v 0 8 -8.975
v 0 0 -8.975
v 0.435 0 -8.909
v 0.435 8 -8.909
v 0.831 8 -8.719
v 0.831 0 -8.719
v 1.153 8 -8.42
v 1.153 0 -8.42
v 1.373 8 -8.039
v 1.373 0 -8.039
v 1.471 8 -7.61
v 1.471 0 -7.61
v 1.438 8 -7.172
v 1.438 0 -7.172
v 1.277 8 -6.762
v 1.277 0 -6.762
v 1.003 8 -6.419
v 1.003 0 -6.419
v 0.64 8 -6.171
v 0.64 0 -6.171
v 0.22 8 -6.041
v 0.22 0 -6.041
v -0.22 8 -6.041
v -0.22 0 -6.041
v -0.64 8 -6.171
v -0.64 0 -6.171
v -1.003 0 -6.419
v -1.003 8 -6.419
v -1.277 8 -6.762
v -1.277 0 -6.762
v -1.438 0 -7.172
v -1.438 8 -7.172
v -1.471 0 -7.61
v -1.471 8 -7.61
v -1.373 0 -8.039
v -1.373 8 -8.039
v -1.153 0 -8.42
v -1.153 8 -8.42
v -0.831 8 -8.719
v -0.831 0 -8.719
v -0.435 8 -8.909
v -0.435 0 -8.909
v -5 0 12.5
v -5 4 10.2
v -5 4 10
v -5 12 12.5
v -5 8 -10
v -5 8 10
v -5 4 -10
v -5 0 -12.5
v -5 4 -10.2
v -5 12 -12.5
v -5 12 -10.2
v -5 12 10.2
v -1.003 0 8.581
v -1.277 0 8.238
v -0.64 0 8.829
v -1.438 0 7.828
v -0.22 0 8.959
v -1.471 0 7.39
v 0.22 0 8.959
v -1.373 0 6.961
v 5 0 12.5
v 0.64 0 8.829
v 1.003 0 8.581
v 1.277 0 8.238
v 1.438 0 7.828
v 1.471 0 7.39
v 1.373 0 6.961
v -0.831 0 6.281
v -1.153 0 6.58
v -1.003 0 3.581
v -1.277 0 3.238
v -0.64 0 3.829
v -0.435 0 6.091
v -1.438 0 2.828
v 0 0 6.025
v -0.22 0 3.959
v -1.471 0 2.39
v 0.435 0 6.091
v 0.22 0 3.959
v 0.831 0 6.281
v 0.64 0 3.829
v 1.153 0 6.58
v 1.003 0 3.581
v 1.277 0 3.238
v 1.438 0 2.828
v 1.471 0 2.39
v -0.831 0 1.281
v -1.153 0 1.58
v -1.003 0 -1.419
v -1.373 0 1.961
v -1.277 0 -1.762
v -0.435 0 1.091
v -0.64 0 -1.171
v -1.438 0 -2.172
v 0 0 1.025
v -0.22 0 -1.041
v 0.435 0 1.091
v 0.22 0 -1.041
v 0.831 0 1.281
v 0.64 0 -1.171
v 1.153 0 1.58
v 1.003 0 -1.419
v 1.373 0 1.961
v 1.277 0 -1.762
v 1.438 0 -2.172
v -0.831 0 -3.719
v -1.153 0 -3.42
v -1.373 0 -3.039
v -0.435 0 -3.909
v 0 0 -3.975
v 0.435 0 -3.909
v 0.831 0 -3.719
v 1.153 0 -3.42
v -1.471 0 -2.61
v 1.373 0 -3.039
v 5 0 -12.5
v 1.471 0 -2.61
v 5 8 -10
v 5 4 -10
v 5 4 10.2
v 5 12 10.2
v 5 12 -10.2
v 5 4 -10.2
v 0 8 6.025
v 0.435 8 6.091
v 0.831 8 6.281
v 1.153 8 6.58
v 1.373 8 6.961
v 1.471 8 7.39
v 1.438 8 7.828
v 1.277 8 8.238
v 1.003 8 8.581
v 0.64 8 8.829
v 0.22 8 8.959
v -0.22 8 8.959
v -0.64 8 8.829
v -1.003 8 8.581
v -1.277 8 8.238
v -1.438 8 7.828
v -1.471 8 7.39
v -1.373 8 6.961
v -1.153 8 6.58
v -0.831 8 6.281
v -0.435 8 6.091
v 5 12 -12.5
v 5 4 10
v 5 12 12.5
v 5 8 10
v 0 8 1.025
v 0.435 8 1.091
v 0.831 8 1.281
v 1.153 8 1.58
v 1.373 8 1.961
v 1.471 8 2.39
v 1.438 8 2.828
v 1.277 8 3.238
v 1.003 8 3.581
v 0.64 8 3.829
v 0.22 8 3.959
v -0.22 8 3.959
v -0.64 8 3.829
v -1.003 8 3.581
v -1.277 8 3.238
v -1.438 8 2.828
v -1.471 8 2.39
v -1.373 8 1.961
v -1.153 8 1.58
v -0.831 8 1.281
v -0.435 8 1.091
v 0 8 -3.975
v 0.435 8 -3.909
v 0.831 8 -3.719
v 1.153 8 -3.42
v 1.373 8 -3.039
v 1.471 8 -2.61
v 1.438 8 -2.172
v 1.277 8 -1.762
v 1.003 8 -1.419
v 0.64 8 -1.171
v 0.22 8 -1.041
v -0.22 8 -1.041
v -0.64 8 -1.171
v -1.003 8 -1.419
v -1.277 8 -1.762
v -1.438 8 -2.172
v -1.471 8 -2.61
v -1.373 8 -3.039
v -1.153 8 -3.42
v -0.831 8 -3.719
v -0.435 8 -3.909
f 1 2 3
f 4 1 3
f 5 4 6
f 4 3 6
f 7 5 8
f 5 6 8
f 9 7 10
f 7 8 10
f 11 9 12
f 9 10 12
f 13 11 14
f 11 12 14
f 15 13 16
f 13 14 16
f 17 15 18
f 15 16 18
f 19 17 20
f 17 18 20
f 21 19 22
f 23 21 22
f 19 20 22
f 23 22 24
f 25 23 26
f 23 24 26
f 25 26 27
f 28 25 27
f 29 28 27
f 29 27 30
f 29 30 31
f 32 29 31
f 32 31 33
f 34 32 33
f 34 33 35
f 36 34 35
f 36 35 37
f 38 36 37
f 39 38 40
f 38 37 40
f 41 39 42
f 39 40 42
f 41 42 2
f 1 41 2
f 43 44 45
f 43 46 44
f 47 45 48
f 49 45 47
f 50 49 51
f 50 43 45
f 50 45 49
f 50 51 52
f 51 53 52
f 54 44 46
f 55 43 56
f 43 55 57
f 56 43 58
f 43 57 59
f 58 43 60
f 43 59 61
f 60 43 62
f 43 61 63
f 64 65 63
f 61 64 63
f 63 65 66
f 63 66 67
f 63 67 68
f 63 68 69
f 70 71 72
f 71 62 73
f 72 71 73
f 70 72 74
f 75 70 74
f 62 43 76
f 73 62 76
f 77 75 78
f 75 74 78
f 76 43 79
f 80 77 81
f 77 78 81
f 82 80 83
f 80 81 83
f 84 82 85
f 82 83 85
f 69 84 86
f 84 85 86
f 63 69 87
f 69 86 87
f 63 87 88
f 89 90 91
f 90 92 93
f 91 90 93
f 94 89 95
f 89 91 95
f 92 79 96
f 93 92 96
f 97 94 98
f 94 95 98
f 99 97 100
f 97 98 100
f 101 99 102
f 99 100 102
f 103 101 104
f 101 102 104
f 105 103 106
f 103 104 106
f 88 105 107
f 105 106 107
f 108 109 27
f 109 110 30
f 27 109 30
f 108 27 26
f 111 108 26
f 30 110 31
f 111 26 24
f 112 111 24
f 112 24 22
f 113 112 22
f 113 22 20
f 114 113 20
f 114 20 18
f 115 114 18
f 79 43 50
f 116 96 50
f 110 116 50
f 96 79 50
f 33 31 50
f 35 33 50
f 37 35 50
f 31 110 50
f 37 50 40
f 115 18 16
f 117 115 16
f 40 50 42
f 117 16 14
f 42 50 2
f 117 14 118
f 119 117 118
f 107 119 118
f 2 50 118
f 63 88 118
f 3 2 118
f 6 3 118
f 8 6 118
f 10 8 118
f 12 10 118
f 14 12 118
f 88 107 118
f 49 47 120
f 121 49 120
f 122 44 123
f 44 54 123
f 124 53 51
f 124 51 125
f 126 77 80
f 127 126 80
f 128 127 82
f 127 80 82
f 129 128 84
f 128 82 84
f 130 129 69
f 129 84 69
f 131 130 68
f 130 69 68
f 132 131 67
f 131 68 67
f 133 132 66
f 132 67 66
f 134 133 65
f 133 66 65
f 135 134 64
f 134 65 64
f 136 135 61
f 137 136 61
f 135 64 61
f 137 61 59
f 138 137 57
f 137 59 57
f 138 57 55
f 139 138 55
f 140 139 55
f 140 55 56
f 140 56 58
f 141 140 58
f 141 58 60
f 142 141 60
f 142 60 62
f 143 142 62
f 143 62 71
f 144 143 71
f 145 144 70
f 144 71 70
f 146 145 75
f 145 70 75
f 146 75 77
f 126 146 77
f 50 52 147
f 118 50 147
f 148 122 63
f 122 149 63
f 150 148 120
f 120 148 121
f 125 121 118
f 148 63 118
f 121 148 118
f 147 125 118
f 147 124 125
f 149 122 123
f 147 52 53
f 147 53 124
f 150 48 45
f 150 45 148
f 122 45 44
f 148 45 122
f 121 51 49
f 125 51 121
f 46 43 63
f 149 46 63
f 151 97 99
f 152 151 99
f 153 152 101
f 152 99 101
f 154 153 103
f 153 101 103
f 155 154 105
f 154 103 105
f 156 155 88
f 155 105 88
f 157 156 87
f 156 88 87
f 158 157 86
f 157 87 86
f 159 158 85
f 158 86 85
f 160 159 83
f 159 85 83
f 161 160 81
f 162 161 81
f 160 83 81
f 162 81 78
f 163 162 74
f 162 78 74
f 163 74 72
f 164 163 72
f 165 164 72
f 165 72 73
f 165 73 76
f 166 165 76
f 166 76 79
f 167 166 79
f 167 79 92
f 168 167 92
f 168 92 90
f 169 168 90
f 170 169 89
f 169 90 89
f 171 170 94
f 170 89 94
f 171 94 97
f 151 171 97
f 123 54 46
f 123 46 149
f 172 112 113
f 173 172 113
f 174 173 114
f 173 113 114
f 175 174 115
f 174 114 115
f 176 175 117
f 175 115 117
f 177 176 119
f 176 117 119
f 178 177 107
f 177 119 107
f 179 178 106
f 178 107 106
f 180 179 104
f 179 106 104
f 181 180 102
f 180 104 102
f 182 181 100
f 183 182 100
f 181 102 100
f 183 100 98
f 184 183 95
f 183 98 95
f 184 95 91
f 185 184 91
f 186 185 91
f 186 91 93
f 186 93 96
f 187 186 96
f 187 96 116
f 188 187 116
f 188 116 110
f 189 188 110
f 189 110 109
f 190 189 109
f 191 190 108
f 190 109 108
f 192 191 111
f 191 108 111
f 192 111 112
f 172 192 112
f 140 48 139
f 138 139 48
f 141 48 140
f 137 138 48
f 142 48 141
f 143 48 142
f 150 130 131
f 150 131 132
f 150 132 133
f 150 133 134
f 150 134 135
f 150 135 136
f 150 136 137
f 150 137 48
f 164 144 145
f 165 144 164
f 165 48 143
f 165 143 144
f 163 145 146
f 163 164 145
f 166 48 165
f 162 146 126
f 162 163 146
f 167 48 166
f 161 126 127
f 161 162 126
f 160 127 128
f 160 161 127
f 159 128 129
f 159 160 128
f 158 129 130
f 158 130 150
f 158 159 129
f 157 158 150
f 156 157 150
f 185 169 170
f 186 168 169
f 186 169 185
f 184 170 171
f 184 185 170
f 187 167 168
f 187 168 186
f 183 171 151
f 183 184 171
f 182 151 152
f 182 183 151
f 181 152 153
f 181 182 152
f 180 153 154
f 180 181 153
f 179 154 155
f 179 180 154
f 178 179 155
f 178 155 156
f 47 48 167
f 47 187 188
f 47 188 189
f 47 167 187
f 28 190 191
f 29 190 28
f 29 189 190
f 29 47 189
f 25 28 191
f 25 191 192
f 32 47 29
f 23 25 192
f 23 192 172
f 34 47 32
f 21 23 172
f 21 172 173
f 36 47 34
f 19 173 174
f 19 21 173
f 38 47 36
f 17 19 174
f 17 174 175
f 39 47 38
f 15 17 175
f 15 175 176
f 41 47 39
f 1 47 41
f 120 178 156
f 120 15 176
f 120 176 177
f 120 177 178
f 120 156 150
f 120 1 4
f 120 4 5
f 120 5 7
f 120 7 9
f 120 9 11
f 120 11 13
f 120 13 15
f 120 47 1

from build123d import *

# Parameters (mm, degrees)
SKETCH1_W           = 10
SKETCH1_H           = 25
BOSS_EXTRUDE1_DEPTH = 8
SKETCH8_W           = 10
SKETCH8_H           = 2.3
BOSS_EXTRUDE4_DEPTH = 4
SKETCH9_W           = 10
SKETCH9_H           = 0.2
CUT_EXTRUDE3_DEPTH  = 4
SKETCH4_R           = 1.475
CUT_EXTRUDE2_DEPTH  = 8
LPATTERN1_COUNT     = 4
LPATTERN1_PITCH     = 5


with BuildPart() as part:
    # Sketch1 → Boss-Extrude1 (new body)
    with BuildSketch(Plane(origin=(0, 0, 0), x_dir=(1, 0, 0), z_dir=(0, 1, 0))):
        Rectangle(SKETCH1_W, SKETCH1_H)
    extrude(amount=BOSS_EXTRUDE1_DEPTH)

    # Sketch8 → Boss-Extrude4 (add)
    with BuildSketch(Plane(origin=(0, 8, 0), x_dir=(1, 0, 0), z_dir=(0, 1, 0))):
        with Locations((0, 11.35)):
            Rectangle(SKETCH8_W, SKETCH8_H)
        with Locations((0, -11.35)):
            Rectangle(SKETCH8_W, SKETCH8_H)
    extrude(amount=BOSS_EXTRUDE4_DEPTH)

    # Sketch9 → Cut-Extrude3 (cut)
    with BuildSketch(Plane(origin=(0, 8, 0), x_dir=(1, 0, 0), z_dir=(0, 1, 0))):
        with Locations((0, 10.1)):
            Rectangle(SKETCH9_W, SKETCH9_H)
        with Locations((0, -10.1)):
            Rectangle(SKETCH9_W, SKETCH9_H)
    extrude(amount=-CUT_EXTRUDE3_DEPTH, mode=Mode.SUBTRACT)

    # Sketch4 → Cut-Extrude2 (cut)
    with BuildSketch(Plane.XZ):
        with Locations(Location((0, 7.5, 0), (0, 0, 270))):
            Circle(SKETCH4_R)
    cut_extrude2 = extrude(amount=-CUT_EXTRUDE2_DEPTH, mode=Mode.SUBTRACT)

    # LPattern1: Cut-Extrude2 ×4
    with Locations(*[(0, 0, -i * LPATTERN1_PITCH) for i in range(1, LPATTERN1_COUNT)]):
        add(cut_extrude2, mode=Mode.SUBTRACT)


solid = part.part
